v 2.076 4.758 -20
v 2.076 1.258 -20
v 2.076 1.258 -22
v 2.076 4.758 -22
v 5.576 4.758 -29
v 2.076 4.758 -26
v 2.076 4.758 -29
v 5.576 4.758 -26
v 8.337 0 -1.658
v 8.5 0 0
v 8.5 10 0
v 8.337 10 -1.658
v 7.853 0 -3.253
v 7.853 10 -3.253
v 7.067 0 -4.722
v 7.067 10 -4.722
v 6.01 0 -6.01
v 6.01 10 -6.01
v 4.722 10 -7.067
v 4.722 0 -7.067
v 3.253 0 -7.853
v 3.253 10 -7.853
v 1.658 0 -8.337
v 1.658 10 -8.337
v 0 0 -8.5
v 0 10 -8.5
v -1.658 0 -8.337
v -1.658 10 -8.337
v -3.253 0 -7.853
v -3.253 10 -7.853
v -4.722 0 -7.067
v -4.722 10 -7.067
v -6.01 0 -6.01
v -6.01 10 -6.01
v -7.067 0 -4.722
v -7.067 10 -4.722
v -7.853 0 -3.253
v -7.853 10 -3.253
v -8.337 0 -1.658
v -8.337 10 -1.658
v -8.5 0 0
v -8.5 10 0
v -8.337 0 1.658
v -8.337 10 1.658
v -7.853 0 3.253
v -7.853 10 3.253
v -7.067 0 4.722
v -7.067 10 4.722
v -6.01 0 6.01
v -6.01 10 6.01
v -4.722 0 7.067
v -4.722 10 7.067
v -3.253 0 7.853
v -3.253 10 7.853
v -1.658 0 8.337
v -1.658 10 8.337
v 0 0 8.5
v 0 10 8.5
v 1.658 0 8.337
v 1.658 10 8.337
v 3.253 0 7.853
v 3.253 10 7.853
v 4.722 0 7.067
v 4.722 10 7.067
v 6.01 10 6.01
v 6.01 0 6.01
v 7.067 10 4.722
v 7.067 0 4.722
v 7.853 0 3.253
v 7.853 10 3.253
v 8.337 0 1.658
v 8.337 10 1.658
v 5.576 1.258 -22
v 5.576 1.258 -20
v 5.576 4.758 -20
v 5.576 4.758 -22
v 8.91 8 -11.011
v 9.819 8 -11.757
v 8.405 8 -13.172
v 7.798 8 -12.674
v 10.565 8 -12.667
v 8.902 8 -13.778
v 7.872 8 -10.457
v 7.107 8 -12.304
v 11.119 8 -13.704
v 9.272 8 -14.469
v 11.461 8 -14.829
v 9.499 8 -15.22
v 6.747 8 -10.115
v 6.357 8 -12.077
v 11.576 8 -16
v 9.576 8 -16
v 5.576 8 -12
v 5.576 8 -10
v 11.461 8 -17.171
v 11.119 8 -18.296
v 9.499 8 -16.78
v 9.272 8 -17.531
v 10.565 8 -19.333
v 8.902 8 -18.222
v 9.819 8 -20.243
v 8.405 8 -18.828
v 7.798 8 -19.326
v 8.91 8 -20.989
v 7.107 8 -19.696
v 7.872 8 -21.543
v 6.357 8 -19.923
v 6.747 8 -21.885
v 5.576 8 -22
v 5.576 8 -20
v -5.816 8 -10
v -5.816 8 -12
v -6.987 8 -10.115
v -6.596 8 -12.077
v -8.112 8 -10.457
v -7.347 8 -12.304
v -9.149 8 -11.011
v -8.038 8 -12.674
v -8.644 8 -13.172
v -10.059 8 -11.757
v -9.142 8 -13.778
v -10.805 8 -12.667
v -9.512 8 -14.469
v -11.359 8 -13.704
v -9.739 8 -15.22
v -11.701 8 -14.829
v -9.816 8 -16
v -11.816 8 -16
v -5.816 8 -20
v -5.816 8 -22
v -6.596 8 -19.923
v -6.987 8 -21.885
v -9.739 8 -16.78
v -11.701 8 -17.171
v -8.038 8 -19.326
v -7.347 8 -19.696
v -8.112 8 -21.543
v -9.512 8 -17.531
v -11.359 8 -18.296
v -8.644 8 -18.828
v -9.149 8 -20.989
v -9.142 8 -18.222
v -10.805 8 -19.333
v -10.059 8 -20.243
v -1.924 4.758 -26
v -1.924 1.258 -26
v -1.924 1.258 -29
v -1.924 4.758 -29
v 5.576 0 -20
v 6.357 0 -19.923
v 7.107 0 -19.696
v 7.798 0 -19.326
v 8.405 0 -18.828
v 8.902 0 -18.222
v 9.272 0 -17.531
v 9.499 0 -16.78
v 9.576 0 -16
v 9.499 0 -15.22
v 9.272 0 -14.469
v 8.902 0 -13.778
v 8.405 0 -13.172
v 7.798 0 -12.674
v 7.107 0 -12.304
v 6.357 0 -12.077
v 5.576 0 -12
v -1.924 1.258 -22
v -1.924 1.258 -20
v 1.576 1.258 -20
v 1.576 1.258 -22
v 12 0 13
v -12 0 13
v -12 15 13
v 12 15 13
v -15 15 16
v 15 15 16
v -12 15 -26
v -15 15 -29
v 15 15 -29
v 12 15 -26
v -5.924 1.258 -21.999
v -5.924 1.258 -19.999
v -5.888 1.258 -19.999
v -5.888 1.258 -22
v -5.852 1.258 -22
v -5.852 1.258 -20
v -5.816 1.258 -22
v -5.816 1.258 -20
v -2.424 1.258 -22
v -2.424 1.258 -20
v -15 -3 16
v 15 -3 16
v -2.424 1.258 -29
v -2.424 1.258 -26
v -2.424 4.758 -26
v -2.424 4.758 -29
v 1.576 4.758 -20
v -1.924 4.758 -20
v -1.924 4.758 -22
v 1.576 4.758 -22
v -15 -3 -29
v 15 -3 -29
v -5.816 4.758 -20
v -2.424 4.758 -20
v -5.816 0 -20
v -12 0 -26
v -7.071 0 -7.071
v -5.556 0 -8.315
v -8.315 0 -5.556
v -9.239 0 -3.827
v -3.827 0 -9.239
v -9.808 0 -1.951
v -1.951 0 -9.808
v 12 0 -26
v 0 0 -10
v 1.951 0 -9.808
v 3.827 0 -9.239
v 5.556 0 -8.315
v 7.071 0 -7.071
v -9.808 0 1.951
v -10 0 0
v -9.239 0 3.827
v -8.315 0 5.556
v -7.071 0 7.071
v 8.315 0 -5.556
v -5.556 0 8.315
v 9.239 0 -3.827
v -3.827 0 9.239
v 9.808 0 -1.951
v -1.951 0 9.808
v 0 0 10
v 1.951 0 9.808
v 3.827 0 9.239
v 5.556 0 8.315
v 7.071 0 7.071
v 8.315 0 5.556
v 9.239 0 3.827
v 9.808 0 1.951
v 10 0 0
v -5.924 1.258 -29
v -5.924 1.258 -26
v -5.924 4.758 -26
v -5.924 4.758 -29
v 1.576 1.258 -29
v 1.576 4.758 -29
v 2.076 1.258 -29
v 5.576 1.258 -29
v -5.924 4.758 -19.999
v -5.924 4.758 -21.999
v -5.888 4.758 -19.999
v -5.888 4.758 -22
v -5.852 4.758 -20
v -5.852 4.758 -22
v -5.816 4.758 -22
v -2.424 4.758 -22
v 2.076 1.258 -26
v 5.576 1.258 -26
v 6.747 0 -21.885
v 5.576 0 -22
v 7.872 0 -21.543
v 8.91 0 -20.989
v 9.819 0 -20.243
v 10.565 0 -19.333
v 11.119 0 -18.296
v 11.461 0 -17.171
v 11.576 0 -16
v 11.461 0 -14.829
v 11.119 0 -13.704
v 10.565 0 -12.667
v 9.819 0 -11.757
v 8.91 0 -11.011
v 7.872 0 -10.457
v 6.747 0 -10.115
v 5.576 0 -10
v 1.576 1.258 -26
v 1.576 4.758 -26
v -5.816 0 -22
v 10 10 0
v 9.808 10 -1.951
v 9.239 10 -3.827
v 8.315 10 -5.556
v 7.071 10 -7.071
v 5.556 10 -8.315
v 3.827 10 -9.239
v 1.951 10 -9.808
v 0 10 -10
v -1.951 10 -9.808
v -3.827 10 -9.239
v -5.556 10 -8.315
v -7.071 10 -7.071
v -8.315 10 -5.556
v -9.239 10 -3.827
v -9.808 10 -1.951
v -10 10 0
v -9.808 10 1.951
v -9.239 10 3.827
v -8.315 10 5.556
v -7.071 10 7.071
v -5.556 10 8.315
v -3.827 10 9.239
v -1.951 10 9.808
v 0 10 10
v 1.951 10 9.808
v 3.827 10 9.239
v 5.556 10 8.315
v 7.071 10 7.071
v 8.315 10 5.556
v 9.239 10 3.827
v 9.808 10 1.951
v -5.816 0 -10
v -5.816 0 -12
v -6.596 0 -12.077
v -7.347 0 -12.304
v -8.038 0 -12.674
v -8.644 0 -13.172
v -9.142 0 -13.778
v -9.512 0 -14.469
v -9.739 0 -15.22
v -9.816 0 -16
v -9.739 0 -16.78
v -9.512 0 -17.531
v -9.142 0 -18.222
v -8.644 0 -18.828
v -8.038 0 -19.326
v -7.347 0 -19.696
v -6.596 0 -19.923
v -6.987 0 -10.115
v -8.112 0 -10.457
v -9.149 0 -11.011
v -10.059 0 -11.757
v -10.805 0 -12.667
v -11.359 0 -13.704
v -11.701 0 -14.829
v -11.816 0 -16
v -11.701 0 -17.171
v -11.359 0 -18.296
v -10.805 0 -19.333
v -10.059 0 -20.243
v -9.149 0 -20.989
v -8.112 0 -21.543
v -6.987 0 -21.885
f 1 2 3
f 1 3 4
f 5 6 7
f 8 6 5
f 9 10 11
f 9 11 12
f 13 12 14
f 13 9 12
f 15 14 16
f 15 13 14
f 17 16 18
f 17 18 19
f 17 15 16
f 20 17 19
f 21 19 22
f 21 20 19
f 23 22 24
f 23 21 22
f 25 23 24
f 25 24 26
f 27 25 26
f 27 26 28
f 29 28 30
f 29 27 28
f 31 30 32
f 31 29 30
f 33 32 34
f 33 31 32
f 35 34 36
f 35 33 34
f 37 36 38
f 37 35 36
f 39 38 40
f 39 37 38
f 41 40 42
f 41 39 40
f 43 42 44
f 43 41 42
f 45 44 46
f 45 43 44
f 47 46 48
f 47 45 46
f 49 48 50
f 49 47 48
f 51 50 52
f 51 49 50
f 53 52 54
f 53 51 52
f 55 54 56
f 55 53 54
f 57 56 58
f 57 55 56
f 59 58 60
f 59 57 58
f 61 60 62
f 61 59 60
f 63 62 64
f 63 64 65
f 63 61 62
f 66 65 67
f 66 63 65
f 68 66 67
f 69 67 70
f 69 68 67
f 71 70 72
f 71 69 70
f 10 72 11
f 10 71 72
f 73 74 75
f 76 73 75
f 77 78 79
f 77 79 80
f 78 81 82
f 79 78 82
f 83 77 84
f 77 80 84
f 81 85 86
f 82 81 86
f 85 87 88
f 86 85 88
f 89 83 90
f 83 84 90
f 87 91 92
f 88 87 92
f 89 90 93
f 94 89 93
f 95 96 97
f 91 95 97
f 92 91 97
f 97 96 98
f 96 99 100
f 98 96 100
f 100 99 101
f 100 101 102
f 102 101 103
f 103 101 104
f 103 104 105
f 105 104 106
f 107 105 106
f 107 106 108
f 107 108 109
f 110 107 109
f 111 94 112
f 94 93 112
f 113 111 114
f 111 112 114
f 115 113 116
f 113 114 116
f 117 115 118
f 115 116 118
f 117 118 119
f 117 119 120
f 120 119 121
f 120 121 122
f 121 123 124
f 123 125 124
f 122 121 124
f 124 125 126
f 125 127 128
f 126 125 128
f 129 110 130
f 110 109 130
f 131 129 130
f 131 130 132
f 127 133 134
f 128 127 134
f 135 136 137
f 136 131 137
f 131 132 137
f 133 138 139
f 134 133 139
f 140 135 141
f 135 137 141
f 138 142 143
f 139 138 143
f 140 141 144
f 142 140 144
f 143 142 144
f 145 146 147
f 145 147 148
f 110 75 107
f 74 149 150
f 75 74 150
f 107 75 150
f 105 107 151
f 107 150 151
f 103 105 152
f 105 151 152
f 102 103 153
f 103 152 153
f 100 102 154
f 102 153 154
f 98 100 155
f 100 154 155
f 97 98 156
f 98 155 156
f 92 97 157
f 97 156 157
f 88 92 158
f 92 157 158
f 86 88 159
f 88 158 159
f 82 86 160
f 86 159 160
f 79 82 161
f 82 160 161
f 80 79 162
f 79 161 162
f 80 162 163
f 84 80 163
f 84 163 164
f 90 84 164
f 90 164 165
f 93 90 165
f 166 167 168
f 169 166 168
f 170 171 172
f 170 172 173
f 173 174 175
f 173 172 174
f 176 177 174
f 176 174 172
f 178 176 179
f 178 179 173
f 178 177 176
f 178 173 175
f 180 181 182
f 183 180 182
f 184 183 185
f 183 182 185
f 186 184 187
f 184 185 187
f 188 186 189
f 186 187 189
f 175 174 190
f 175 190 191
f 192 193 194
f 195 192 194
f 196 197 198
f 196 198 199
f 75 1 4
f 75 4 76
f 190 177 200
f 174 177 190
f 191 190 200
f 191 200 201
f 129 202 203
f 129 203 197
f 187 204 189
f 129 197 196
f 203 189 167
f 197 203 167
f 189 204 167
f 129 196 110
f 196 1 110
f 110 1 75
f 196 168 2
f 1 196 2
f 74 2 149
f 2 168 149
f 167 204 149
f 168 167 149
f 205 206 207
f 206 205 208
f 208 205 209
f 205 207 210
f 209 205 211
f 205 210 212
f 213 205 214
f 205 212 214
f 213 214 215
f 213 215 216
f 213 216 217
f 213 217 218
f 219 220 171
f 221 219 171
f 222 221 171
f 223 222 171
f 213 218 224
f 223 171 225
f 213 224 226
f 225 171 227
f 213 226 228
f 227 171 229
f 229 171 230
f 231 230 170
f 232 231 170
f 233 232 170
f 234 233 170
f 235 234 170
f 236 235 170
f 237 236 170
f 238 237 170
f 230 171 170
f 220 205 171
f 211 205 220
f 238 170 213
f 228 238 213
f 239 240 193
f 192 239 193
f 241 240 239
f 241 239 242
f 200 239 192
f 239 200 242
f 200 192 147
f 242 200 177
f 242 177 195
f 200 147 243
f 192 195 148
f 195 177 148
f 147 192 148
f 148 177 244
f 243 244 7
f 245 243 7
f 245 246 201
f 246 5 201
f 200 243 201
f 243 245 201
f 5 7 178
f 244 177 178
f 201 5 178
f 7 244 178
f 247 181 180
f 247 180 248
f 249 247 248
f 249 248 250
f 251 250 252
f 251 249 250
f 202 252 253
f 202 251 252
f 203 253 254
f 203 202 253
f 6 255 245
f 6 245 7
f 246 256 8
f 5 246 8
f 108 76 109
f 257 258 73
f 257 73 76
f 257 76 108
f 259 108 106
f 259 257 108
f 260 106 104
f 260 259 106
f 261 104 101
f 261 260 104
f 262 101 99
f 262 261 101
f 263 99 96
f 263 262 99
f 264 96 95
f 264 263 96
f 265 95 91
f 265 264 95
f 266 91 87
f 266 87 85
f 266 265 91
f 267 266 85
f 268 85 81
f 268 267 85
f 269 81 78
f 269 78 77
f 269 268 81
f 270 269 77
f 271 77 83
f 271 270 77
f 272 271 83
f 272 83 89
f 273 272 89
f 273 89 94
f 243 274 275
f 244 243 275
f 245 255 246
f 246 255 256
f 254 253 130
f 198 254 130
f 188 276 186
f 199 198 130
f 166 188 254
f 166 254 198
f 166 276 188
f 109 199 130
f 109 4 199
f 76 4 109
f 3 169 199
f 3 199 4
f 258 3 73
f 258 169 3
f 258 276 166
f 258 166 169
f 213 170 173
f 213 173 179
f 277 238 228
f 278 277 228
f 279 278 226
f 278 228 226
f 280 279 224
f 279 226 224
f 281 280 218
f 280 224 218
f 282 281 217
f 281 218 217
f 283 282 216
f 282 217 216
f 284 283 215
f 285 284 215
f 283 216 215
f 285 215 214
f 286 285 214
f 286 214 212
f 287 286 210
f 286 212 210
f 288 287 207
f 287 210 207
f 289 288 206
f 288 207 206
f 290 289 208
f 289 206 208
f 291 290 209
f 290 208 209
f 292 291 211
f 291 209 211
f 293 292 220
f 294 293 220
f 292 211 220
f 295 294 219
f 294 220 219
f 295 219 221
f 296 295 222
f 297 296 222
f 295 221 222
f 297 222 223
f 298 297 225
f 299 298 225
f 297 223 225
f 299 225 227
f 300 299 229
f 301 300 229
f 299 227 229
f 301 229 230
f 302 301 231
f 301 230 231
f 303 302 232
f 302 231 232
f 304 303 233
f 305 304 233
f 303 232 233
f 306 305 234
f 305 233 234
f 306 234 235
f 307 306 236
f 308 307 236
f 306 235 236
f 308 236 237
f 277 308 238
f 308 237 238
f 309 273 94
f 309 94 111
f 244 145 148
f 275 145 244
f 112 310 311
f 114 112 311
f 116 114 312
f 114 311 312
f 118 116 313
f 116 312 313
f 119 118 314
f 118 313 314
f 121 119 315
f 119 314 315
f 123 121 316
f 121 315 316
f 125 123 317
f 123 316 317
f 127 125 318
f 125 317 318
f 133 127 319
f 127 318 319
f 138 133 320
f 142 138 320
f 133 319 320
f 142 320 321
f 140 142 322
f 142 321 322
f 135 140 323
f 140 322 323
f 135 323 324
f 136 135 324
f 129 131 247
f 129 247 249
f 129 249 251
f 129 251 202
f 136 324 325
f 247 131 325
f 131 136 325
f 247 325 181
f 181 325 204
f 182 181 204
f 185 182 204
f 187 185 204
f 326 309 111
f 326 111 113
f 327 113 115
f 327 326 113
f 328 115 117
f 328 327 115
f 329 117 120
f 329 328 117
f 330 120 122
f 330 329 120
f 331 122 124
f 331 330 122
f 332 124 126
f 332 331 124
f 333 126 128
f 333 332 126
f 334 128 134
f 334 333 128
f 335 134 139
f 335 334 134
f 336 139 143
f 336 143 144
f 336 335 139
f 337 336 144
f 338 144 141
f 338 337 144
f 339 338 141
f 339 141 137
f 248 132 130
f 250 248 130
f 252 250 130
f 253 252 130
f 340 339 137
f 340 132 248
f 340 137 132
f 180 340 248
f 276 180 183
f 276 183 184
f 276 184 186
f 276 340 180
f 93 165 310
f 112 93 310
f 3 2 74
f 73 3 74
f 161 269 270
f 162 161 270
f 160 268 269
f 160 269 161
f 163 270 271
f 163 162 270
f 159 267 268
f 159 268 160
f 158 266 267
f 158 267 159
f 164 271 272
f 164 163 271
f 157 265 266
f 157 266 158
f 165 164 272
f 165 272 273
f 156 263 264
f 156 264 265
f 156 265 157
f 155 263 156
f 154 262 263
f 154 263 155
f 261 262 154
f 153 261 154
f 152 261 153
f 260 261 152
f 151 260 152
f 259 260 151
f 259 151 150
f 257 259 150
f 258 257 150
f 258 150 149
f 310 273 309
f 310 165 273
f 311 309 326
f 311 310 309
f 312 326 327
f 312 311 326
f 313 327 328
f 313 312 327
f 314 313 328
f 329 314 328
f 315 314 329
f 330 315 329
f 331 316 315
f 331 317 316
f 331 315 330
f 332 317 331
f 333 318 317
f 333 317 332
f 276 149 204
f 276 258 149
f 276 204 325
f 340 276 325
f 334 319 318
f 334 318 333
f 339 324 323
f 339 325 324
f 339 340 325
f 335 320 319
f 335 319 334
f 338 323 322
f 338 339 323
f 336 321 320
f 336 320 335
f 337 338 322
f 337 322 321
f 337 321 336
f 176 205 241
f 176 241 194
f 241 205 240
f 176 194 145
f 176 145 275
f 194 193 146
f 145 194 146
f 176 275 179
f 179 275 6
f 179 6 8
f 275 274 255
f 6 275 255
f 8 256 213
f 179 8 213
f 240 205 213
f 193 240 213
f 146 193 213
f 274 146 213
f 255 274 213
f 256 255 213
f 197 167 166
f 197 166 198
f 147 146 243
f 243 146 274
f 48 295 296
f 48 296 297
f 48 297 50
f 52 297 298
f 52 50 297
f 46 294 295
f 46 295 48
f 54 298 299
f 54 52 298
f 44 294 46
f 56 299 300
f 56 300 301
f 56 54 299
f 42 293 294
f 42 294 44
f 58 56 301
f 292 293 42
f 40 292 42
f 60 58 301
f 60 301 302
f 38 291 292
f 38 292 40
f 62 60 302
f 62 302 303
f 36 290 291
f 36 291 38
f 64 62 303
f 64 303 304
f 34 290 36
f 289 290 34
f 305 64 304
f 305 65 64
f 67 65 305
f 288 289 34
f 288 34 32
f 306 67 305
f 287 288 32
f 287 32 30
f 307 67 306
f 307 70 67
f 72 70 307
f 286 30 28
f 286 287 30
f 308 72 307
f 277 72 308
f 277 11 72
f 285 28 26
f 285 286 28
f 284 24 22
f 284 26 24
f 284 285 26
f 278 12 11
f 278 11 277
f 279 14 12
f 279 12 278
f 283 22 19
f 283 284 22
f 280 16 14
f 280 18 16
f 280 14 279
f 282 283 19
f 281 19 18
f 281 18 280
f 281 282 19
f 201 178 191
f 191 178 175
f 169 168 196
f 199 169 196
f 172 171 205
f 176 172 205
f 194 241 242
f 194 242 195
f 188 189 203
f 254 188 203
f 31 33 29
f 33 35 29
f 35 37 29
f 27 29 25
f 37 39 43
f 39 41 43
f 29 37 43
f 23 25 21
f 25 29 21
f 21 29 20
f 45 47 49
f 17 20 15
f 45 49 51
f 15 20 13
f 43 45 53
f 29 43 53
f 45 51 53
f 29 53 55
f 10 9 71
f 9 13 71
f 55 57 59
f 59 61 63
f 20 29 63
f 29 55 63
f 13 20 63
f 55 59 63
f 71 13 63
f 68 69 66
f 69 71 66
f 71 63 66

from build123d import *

# Parameters (mm, degrees)
SKETCH1_W               = 30
SKETCH1_H               = 45
SKETCH1_W_2             = 24
SKETCH1_H_2             = 39
BOSS_EXTRUDE4_DEPTH     = 10
SKETCH1_R               = 10
SKETCH1_R_2             = 8.5
BOSS_EXTRUDE4_2_DEPTH   = 10
SKETCH1_5_W             = 30
SKETCH1_5_H             = 45
SKETCH1_5_W_2           = 24
SKETCH1_5_H_2           = 39
BOSS_EXTRUDE5_DEPTH     = 15
SKETCH3_W               = 30
SKETCH3_H               = 45
BOSS_EXTRUDE6_DEPTH     = 3
BOSS_EXTRUDE9_DEPTH     = 8
CUT_EXTRUDE2_DEPTH      = 11
CUT_EXTRUDE2_DEPTH_BACK = 8
SKETCH6_W               = 3.5
SKETCH6_H               = 3.5


with BuildPart() as part:
    # Sketch1 → Boss-Extrude4 (new body)
    with BuildSketch(Plane(origin=(0, 0, 0), x_dir=(1, 0, 0), z_dir=(0, 1, 0))):
        with Locations((0, 6.5)):
            Rectangle(SKETCH1_W, SKETCH1_H)
        with Locations((0, 6.5)):
            Rectangle(SKETCH1_W_2, SKETCH1_H_2, mode=Mode.SUBTRACT)
    extrude(amount=BOSS_EXTRUDE4_DEPTH)

    # Sketch1<5> → Boss-Extrude5 (add)
    with BuildSketch(Plane(origin=(0, 0, 0), x_dir=(1, 0, 0), z_dir=(0, 1, 0))):
        with Locations((0, 6.5)):
            Rectangle(SKETCH1_5_W, SKETCH1_5_H)
        with Locations((0, 6.5)):
            Rectangle(SKETCH1_5_W_2, SKETCH1_5_H_2, mode=Mode.SUBTRACT)
    extrude(amount=BOSS_EXTRUDE5_DEPTH)



with BuildPart() as body_2:
    # Sketch1 → Boss-Extrude4 2 (new body)
    with BuildSketch(Plane(origin=(0, 0, 0), x_dir=(1, 0, 0), z_dir=(0, 1, 0))):
        Circle(SKETCH1_R)
        Circle(SKETCH1_R_2, mode=Mode.SUBTRACT)
    extrude(amount=BOSS_EXTRUDE4_2_DEPTH)


with BuildPart() as part_1:
    add(part.part)

    add(body_2.part)  # Boss-Extrude6 merges body 2
    # Sketch3 → Boss-Extrude6 (add)
    with BuildSketch(Plane.XZ):
        with Locations((0, -6.5)):
            Rectangle(SKETCH3_W, SKETCH3_H)
    extrude(amount=BOSS_EXTRUDE6_DEPTH)


with BuildPart() as body_2_2:
    # Sketch4 → Boss-Extrude9 (new body)
    with BuildSketch(Plane(origin=(0, 0, 0), x_dir=(1, 0, 0), z_dir=(0, 1, 0))):
        with BuildLine():
            Line((-5.815986723, 22), (5.576152219, 22))
            ThreePointArc((5.576152219, 22), (11.576152219, 16), (5.576152219, 10))
            Line((5.576152219, 10), (-5.815986723, 10))
            ThreePointArc((-5.815986723, 10), (-11.815986723, 16), (-5.815986723, 22))
        make_face()
        with BuildLine():
            Line((-5.815986723, 20), (5.576152219, 20))
            ThreePointArc((5.576152219, 20), (9.576152219, 16), (5.576152219, 12))
            Line((5.576152219, 12), (-5.815986723, 12))
            ThreePointArc((-5.815986723, 12), (-9.815986723, 16), (-5.815986723, 20))
        make_face(mode=Mode.SUBTRACT)
    extrude(amount=BOSS_EXTRUDE9_DEPTH)


with BuildPart() as cut_extrude2_tool:
    # Sketch6 → Cut-Extrude2 (new, two sides: drawn at the far end of the back side and taken through both)
    with BuildSketch(Plane.XY.offset(-26).offset(-CUT_EXTRUDE2_DEPTH_BACK)):
        with Locations((3.826152219, 3.007864186)):
            Rectangle(SKETCH6_W, SKETCH6_H)
        with Locations((-0.173847781, 3.007864186)):
            Rectangle(SKETCH6_W, SKETCH6_H)
        with Locations((-4.173847781, 3.007864186)):
            Rectangle(SKETCH6_W, SKETCH6_H)
    extrude(amount=CUT_EXTRUDE2_DEPTH + CUT_EXTRUDE2_DEPTH_BACK)


with BuildPart() as part_2:
    add(part_1.part)

    # Cut-Extrude2: cut by cut_extrude2_tool
    add(cut_extrude2_tool.part, mode=Mode.SUBTRACT)


with BuildPart() as body_2_2_1:
    add(body_2_2.part)

    # Cut-Extrude2: cut by cut_extrude2_tool
    add(cut_extrude2_tool.part, mode=Mode.SUBTRACT)


solid = Compound([part_2.part, body_2_2_1.part])
